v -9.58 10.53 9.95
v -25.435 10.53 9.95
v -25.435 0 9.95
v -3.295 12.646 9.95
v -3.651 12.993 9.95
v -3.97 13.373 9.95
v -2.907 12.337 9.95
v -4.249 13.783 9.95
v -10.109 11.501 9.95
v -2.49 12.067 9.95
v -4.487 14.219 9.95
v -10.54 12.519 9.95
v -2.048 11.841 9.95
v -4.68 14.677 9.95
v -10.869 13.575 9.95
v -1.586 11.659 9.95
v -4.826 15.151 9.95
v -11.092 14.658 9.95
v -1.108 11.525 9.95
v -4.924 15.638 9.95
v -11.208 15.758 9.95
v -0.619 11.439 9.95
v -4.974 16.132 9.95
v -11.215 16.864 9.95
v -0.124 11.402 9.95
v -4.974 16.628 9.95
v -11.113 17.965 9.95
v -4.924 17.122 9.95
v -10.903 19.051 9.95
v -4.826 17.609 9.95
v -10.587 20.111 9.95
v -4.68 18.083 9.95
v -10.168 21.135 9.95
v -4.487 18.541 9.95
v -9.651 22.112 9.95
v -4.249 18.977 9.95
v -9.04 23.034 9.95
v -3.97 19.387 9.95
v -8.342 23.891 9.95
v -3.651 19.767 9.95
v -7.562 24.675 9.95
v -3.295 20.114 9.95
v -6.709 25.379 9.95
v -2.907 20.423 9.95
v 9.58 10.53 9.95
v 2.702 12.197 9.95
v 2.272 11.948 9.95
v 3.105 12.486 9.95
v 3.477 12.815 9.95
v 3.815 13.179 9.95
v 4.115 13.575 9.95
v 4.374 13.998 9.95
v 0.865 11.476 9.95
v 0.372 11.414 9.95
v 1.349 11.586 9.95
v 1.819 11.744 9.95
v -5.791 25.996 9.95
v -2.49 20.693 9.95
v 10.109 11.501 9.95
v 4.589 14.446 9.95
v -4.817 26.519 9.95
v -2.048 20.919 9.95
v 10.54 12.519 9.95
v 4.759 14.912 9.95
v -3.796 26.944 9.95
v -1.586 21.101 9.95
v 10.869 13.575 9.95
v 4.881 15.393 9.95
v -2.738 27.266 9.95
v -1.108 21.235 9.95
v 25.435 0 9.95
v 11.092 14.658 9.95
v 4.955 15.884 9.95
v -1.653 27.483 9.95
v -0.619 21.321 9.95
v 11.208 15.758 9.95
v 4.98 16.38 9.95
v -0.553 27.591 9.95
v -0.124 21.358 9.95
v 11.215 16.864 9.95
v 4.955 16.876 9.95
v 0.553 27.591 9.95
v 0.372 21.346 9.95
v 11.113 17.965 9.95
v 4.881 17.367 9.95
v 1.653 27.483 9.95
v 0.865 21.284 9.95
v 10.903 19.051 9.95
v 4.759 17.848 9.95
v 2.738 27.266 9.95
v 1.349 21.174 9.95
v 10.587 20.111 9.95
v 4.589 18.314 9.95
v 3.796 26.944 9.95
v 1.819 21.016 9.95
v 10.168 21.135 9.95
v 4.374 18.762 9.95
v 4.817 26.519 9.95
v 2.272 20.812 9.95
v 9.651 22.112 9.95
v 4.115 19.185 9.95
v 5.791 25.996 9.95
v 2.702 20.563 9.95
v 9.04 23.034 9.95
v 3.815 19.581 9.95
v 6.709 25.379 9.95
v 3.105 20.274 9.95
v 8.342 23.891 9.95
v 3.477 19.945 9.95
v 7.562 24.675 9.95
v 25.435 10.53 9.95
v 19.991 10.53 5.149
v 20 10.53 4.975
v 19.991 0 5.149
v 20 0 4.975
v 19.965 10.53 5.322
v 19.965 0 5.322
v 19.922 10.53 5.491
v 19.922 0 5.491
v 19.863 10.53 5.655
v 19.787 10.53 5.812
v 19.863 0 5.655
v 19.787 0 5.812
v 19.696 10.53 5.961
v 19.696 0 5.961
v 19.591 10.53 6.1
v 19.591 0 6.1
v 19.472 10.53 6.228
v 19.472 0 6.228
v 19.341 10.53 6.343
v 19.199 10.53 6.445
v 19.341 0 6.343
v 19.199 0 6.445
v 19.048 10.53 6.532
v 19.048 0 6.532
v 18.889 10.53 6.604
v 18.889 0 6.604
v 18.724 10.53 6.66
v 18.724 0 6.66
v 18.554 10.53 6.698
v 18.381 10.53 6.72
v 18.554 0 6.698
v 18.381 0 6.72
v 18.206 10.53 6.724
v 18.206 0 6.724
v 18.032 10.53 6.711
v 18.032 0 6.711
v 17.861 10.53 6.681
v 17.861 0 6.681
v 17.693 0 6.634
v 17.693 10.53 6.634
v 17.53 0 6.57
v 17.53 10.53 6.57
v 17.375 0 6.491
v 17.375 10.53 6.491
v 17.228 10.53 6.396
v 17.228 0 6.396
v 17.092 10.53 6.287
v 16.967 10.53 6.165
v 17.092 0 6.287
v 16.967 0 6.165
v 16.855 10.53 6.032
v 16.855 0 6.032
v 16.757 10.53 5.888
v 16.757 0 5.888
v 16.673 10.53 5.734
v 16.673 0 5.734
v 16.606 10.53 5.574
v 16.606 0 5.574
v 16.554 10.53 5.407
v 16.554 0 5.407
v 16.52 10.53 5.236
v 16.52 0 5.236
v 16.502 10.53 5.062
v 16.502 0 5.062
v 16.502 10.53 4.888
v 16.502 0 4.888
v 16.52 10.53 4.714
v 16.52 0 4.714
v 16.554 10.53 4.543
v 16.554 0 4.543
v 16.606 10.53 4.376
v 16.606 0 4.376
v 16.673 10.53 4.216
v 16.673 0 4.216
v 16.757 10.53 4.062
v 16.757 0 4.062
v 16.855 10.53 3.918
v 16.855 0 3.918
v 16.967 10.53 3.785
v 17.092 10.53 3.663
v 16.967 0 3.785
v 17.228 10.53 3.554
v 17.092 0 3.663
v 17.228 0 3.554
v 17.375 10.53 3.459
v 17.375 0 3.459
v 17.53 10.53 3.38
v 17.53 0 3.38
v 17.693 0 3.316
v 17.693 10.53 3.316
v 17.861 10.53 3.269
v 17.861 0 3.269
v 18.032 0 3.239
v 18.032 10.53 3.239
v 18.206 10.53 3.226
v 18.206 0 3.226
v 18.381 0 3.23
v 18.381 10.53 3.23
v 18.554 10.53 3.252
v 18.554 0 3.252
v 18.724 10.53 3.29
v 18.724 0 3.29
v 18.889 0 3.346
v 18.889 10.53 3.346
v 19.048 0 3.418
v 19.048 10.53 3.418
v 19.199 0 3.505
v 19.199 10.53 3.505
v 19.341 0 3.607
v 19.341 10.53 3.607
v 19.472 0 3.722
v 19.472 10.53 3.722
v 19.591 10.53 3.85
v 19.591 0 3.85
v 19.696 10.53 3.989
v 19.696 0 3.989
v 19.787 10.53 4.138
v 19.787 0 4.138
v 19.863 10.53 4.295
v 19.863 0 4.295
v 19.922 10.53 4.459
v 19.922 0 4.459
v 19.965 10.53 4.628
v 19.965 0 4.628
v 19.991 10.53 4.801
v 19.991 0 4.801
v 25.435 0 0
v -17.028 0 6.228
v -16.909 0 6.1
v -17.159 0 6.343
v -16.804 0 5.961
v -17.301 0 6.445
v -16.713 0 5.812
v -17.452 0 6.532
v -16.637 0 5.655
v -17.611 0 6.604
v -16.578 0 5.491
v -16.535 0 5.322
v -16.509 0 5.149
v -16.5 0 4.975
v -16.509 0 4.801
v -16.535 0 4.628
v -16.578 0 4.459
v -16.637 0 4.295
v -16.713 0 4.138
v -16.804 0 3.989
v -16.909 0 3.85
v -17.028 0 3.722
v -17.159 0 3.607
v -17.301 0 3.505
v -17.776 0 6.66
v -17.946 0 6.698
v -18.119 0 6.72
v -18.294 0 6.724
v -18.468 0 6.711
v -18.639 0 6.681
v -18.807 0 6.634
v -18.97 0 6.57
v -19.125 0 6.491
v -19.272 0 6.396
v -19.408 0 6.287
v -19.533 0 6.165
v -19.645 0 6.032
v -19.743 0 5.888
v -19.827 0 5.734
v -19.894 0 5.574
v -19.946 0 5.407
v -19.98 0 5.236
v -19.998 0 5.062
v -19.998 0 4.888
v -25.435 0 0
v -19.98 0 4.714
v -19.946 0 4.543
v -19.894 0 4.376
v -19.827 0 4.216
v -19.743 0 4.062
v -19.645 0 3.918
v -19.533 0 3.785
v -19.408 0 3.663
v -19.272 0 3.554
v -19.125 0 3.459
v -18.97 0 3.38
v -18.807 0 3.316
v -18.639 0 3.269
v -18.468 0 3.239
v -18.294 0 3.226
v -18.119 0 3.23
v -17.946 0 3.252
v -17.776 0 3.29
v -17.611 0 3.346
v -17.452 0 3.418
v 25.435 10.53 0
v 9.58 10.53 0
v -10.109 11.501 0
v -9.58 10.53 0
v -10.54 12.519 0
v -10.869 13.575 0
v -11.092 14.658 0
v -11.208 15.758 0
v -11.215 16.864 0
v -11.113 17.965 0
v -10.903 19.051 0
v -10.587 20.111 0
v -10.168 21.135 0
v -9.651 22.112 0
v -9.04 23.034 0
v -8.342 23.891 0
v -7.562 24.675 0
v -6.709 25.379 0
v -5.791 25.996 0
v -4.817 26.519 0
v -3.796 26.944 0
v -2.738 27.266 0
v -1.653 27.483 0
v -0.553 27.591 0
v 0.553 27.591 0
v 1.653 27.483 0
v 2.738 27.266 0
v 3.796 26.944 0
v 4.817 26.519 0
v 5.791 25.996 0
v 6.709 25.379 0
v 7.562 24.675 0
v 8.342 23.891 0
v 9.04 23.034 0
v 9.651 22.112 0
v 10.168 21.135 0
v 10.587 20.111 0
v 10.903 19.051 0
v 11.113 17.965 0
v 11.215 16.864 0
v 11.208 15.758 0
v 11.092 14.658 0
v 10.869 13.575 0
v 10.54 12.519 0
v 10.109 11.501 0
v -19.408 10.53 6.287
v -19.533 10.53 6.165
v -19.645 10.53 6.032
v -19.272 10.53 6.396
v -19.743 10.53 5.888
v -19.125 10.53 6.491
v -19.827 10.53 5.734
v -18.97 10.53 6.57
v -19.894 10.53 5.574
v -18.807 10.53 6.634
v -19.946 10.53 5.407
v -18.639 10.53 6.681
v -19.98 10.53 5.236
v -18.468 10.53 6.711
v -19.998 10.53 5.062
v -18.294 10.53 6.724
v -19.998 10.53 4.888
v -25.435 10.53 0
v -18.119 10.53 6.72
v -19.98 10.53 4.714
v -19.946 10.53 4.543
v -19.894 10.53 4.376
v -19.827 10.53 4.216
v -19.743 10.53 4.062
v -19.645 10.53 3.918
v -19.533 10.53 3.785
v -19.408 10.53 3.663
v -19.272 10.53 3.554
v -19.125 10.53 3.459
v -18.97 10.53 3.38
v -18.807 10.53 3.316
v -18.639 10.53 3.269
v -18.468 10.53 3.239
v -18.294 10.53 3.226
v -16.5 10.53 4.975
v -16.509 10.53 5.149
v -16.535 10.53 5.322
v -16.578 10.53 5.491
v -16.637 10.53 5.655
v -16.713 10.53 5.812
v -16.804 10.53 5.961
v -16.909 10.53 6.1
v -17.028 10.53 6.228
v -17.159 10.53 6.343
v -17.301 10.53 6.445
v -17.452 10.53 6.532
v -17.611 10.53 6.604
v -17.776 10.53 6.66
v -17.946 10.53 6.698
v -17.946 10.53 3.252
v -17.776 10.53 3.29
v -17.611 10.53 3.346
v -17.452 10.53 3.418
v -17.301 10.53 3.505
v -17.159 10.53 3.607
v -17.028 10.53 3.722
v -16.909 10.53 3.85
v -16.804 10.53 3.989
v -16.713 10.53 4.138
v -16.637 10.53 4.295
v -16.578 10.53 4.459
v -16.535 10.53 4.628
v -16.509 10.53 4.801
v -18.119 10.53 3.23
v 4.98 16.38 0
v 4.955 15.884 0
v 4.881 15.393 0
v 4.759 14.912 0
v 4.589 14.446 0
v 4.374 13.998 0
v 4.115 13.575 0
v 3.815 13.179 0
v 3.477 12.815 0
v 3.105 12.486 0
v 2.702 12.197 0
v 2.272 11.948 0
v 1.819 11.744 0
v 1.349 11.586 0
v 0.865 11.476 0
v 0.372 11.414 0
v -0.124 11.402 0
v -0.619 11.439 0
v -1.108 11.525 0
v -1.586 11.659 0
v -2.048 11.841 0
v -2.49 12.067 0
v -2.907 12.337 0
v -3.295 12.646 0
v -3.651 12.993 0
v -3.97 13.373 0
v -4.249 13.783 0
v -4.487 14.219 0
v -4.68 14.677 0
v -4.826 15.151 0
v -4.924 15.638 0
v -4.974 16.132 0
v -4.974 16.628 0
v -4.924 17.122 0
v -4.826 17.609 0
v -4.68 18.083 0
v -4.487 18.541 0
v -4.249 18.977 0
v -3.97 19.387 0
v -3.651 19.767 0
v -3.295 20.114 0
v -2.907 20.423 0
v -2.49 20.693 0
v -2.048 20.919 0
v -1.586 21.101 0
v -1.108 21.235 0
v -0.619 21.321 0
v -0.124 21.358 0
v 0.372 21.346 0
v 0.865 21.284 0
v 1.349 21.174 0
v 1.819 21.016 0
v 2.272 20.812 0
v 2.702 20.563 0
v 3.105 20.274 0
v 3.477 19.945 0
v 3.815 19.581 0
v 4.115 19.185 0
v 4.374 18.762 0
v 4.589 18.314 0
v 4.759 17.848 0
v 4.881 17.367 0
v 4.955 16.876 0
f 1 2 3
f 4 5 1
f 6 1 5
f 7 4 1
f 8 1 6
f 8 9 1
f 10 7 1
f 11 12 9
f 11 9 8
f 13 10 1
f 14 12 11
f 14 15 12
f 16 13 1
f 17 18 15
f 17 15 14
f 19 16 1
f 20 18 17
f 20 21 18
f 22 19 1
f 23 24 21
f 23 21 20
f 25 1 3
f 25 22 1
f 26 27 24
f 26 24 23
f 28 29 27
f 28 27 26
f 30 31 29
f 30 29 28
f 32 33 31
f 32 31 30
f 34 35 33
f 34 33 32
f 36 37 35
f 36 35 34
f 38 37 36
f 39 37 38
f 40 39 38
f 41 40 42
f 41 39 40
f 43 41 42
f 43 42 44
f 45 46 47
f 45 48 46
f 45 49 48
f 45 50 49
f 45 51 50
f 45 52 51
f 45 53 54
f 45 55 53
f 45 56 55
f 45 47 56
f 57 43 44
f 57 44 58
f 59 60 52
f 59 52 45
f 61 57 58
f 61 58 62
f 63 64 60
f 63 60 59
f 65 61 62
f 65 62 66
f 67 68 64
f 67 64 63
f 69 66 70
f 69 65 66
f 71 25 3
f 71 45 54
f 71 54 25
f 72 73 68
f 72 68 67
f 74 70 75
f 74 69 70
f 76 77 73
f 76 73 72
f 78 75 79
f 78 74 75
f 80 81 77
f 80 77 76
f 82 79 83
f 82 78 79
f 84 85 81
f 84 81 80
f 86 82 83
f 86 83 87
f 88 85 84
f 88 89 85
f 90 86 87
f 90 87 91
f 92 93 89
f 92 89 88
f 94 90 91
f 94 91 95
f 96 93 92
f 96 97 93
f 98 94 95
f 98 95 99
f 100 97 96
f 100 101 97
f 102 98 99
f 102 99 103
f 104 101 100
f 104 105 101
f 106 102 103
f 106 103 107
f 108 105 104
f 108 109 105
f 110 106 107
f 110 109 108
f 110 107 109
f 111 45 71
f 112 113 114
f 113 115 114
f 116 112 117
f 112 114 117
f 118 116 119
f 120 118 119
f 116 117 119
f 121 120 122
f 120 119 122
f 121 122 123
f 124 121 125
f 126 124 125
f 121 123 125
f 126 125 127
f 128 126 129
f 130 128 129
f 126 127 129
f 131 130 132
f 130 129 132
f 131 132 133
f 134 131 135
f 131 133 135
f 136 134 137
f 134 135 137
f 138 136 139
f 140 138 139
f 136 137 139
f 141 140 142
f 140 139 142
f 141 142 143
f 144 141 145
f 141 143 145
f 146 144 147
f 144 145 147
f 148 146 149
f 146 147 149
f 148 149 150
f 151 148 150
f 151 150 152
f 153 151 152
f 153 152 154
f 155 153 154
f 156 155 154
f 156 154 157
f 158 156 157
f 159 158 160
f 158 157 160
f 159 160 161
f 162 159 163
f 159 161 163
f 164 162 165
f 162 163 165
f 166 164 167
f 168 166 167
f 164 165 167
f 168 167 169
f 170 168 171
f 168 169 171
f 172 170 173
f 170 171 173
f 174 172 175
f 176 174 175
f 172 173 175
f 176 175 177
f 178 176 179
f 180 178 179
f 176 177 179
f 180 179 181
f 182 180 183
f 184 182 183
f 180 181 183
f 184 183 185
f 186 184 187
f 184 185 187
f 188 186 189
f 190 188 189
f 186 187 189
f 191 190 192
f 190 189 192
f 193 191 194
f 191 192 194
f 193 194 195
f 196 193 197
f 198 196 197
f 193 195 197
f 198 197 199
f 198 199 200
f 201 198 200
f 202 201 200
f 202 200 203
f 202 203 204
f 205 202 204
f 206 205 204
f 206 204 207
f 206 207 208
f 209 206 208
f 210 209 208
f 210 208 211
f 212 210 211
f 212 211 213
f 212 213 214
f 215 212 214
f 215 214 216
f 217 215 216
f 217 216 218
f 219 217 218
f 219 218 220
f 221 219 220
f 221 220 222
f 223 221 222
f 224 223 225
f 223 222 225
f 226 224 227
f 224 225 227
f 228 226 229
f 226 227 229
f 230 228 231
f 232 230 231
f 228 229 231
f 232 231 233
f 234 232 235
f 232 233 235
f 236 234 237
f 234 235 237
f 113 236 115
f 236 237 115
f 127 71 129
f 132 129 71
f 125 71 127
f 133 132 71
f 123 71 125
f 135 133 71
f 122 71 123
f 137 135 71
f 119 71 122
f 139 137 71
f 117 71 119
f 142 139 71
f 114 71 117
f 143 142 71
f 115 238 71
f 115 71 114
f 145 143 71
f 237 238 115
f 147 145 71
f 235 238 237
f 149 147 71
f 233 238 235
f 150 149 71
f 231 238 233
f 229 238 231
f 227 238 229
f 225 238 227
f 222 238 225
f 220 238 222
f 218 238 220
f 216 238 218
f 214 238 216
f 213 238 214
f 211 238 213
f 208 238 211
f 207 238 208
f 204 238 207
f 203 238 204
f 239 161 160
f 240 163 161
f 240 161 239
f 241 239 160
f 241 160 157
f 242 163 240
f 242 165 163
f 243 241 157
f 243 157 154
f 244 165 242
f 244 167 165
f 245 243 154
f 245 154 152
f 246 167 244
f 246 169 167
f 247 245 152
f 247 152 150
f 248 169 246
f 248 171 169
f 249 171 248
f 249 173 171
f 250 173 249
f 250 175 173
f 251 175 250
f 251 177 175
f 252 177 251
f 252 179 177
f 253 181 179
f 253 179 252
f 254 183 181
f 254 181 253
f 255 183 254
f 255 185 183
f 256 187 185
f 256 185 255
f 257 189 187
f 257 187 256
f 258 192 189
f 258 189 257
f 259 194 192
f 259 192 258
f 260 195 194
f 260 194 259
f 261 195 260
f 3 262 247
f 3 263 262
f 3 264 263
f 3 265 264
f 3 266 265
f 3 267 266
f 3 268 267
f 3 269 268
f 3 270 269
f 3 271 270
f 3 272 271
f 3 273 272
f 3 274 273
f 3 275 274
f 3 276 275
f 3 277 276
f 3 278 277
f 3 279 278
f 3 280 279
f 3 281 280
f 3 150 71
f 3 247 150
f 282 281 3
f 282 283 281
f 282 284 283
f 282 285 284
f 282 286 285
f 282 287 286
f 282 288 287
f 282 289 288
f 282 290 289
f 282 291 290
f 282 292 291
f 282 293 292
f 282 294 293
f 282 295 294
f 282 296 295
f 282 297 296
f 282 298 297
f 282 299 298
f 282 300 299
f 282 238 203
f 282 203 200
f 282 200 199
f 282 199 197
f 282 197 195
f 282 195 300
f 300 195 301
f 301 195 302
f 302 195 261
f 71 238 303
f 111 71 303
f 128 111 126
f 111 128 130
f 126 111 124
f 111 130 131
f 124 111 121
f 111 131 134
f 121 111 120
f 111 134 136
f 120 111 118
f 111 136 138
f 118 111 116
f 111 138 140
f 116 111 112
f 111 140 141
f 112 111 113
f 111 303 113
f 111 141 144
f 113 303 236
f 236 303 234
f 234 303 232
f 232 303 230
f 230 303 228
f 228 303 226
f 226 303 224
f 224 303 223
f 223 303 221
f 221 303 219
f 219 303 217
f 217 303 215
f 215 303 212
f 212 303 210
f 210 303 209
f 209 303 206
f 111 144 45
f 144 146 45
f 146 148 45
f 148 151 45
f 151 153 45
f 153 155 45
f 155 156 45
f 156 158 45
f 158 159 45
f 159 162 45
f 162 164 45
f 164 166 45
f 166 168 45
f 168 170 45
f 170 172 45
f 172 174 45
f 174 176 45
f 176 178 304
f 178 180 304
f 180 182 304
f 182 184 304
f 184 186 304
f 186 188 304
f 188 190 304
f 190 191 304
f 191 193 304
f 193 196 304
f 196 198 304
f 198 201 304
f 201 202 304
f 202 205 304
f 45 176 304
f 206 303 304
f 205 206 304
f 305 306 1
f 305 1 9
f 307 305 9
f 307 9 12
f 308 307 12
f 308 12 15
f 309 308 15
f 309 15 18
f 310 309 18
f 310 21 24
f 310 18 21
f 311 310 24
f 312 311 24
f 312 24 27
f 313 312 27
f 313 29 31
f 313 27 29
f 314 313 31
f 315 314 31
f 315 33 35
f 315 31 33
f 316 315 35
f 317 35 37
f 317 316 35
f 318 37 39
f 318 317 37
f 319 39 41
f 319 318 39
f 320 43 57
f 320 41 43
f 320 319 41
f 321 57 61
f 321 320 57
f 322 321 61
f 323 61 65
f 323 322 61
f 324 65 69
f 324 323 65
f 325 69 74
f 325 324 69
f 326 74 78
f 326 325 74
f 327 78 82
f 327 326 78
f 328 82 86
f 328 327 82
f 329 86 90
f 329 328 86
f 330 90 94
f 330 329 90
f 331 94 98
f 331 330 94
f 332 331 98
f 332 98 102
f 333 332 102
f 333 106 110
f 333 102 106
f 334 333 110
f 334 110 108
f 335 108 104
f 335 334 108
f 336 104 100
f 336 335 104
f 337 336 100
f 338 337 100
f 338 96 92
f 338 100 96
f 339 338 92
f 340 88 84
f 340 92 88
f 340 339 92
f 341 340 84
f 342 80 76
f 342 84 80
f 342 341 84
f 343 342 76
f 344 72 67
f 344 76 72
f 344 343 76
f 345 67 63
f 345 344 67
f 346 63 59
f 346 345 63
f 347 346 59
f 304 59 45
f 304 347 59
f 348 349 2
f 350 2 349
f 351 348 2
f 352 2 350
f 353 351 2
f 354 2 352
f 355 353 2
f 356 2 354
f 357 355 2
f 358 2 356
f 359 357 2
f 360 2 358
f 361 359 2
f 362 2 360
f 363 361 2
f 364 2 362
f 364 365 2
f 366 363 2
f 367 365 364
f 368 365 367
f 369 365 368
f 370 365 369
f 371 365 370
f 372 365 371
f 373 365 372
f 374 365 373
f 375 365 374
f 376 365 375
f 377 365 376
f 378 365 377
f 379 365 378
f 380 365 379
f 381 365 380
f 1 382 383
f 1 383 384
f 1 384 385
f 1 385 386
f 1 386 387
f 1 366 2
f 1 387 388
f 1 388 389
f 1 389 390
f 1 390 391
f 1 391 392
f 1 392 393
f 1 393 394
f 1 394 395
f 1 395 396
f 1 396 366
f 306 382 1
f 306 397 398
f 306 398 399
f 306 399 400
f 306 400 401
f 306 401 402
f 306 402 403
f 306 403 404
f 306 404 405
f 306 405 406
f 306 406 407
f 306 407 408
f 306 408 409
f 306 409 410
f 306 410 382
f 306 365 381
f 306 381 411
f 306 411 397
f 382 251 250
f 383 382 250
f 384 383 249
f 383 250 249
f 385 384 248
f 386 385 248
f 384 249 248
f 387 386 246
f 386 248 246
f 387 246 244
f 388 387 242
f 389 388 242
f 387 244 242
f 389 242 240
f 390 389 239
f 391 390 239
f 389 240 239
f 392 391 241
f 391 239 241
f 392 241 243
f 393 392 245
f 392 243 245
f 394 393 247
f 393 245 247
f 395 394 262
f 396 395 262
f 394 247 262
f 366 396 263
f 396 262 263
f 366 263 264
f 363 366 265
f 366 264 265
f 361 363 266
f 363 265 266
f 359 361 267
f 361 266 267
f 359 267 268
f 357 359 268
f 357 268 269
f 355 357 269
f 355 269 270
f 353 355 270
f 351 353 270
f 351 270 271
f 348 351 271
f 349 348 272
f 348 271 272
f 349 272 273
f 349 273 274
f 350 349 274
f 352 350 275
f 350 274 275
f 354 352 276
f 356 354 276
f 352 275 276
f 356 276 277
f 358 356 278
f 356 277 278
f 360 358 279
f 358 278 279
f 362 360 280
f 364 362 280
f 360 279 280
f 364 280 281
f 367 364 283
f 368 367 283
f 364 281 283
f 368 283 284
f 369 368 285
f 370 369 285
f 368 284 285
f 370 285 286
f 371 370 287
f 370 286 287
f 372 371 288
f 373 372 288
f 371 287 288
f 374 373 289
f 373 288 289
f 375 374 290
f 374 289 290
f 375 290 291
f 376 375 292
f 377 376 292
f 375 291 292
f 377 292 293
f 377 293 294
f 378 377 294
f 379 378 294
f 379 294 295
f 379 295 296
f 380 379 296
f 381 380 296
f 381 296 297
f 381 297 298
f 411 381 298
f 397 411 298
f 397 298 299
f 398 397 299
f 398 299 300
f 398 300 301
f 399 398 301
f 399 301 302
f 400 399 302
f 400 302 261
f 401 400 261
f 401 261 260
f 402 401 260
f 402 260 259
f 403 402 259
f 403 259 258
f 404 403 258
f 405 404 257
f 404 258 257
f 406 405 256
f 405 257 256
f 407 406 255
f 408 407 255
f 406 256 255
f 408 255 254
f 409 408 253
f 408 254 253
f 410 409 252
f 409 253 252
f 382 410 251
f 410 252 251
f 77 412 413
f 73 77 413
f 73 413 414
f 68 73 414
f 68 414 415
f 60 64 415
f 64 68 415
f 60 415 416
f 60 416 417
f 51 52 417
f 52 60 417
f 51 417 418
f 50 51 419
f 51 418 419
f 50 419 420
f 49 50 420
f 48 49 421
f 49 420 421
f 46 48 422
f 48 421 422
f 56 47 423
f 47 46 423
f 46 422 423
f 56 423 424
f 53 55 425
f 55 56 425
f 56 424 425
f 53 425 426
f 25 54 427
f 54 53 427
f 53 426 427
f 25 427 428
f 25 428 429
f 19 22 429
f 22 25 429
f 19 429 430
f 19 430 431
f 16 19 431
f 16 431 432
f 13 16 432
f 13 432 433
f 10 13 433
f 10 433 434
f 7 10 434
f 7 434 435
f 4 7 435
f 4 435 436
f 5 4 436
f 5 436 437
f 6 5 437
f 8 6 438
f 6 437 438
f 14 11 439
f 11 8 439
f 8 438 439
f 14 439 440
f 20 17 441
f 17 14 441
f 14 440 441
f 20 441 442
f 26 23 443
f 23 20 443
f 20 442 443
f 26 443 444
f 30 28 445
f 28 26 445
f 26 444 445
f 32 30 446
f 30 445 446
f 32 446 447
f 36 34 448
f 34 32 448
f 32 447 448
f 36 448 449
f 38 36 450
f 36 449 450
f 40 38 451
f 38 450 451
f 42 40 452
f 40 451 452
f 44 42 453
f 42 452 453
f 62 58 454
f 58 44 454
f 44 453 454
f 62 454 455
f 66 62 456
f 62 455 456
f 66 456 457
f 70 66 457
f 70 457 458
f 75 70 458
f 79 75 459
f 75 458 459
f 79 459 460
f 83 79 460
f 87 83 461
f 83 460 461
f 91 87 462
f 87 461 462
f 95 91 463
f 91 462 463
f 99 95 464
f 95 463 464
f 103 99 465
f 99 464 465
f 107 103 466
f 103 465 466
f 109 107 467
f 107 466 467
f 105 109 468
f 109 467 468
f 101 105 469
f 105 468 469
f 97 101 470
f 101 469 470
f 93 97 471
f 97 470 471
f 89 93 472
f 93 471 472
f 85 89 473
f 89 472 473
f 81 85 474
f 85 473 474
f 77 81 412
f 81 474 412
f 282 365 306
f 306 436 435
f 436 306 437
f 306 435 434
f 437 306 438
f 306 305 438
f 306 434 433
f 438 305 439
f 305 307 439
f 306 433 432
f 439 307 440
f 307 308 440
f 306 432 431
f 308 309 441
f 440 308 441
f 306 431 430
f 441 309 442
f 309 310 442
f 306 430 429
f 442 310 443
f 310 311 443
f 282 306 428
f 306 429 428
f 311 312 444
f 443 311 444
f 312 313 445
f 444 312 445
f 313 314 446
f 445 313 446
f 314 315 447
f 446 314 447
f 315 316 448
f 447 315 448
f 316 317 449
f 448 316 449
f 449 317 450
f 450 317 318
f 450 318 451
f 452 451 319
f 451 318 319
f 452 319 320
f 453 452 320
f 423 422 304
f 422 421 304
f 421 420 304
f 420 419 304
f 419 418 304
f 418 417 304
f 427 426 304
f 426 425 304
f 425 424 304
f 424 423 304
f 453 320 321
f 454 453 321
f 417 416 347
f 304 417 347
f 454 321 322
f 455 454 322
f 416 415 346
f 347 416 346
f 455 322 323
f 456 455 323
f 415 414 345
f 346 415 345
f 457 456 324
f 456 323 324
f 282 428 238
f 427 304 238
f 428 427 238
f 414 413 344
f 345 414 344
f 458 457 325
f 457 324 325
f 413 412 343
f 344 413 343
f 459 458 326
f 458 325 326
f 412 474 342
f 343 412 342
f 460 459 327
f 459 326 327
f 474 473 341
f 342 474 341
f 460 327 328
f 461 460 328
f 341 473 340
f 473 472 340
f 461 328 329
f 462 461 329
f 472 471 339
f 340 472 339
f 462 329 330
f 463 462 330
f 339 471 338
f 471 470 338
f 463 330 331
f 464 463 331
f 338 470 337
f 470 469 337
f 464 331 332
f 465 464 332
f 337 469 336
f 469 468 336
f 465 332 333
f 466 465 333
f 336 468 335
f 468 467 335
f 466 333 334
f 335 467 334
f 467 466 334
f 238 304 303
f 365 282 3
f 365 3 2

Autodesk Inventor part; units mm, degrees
ref_plane "YZ Plane" through (0, 0, 0) normal (1, 0, 0) x (0, 1, 0)
ref_plane "XZ Plane" through (0, 0, 0) normal (0, 1, 0) x (-1, 0, 0)
ref_plane "XY Plane" through (0, 0, 0) normal (0, 0, 1) x (1, 0, 0)
sketch "Boceto1" plane through (0, 0, 0) normal (0, 0, 1) x (1, 0, 0)
  line L0 (0, 0) -> (-25.435, 0)
  line L1 (-25.435, 0) -> (-25.435, 10.53)
  line L2 (0, 0) -> (0, 11.4) construction
  arc A0 (9.5801, 10.53) -> (-9.5801, 10.53) centre (0, 16.38) ccw
  circle A1 centre (0, 16.38) radius 4.98
  line L3 (-25.435, 10.53) -> (-9.5801, 10.53)
  line L4 (0, 0) -> (25.435, 0)
  line L5 (25.435, 0) -> (25.435, 10.53)
  line L6 (25.435, 10.53) -> (9.5801, 10.53)
  dimension "d4" = 9.96
  dimension "d0" = 25.435
  dimension "d1" = 10.53
  dimension "d2" = 11.4
  dimension "d3" = 22.45
extrude "Extrusión1" add sketch "Boceto1" along normal blind 9.95
sketch "Boceto2" plane through (-25.435, 0, 0) normal (0, -1, 0) x (1, 0, 0)
  line L0 (25.435, 0) -> (25.435, 9.95) construction
  line L1 (36.66, 9.95) -> (14.21, 9.95) projected
  line L2 (25.435, 4.975) -> (41.935, 4.975) construction
  line L3 (41.935, 4.975) -> (43.685, 4.975) construction
  circle A0 centre (43.685, 4.975) radius 1.75
  circle A1 centre (7.185, 4.975) radius 1.75
  point P0 (35.0151, 9.95)
  point P1 (15.8549, 9.95)
  dimension "d7" = 16.5
  dimension "d8" = 1.75
extrude "Extrusión2" cut sketch "Boceto2" against normal up to surface (10.53 mm away)
properties part number "003" material "Steel"
